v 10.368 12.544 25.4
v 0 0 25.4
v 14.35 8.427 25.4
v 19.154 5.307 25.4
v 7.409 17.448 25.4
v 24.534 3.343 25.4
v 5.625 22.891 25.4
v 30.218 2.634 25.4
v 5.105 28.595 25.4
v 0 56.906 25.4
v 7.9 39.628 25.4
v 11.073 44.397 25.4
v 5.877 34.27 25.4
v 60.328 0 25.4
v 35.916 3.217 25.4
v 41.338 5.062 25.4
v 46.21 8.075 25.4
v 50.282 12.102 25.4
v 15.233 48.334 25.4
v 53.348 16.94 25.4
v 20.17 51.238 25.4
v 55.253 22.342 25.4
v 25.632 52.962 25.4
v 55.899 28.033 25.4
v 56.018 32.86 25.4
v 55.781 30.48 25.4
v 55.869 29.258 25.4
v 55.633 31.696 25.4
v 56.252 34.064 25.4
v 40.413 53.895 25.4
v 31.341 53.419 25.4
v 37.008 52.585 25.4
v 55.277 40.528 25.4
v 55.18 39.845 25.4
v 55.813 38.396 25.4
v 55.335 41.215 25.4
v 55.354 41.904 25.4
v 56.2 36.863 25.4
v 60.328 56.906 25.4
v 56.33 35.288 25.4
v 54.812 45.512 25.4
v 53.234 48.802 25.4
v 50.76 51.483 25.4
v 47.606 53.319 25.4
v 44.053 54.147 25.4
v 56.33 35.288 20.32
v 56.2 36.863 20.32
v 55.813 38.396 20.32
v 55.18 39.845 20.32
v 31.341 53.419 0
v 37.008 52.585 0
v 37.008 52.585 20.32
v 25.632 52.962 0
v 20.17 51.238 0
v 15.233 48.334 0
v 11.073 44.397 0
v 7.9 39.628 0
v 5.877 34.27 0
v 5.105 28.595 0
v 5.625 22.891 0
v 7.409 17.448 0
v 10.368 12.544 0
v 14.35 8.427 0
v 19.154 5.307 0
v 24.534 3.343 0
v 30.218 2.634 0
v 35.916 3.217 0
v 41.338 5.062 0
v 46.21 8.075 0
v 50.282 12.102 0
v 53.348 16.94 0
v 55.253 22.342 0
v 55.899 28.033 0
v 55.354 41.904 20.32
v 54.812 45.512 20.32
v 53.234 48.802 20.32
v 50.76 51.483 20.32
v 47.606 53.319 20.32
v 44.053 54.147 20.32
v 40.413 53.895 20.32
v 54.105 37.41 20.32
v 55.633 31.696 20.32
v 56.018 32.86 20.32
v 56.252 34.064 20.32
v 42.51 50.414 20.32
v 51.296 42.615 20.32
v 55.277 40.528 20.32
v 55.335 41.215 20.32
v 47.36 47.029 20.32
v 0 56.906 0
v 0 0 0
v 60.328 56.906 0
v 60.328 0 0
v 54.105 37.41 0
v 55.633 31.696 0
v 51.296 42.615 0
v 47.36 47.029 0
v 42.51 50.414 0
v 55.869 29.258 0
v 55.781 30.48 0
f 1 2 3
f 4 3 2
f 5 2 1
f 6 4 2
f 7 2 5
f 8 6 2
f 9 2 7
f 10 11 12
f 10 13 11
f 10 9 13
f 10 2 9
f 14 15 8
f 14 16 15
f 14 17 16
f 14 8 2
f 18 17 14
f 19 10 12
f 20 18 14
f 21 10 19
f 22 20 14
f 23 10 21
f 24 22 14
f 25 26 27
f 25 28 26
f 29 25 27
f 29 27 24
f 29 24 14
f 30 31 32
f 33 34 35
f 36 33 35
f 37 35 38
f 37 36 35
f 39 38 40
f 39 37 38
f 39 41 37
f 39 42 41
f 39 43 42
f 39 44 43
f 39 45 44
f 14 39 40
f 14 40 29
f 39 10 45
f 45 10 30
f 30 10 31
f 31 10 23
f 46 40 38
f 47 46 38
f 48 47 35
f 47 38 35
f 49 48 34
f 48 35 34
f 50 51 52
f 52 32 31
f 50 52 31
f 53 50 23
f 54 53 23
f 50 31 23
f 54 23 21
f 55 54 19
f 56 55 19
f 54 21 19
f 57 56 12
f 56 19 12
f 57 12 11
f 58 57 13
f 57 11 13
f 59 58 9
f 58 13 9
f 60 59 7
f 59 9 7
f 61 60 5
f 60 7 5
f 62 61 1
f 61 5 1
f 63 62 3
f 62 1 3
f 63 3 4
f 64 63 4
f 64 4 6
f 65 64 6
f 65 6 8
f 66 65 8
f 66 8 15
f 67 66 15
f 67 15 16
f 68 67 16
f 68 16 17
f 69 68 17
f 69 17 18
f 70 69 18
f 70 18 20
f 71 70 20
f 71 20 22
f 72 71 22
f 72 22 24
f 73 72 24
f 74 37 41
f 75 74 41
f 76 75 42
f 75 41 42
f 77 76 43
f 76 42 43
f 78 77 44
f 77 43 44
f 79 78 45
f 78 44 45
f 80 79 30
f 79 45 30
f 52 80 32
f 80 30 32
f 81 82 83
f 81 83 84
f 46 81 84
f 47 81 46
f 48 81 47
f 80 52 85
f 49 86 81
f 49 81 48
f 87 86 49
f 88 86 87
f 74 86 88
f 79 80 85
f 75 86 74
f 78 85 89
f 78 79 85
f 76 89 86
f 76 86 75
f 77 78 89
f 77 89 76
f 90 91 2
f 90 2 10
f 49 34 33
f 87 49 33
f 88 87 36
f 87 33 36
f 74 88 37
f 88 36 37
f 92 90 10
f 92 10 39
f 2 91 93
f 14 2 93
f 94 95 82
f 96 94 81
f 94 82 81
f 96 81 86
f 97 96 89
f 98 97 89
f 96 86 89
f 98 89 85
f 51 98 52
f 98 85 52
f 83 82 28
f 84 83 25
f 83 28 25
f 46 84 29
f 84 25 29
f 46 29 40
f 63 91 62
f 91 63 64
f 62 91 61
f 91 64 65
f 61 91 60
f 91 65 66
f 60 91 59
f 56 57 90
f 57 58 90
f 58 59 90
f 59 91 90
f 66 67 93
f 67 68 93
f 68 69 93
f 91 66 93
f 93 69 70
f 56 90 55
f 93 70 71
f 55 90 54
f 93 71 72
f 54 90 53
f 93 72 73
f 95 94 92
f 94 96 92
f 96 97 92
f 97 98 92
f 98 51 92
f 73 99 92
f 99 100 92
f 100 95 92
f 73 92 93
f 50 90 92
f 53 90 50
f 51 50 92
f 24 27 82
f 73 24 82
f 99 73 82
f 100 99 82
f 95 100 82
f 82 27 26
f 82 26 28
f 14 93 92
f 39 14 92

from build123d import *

# Parameters (mm, degrees)
F0_W     = 60.3283978999
F0_H     = 56.9055080414
F1_DEPTH = 25.4
F3_DEPTH = 5.08
F5_DEPTH = 25.401


with BuildPart() as f1:
    # F0 (on Top) → F1 (new body)
    with BuildSketch(Plane.XY):
        with Locations((30.1641989499, 28.4527540207)):
            Rectangle(F0_W, F0_H)
    extrude(amount=F1_DEPTH)

    # F2 (on face) → F3 (cut)
    with BuildSketch(Plane.XY.offset(25.4)):
        with BuildLine():
            ThreePointArc((55.1804514534, 39.8446242733), (55.3108318877, 40.8708207203), (55.3543950429, 41.9043488801))
            ThreePointArc((55.3543950429, 41.9043488801), (36.2534657798, 52.11936711), (38.3624892299, 30.5614424362))
            ThreePointArc((38.3624892299, 30.5614424362), (42.0828202021, 43.6972697394), (55.1804514534, 39.8446242733))
        make_face()
        with BuildLine():
            ThreePointArc((55.1804514534, 39.8446242733), (42.0828202021, 43.6972697394), (38.3624892299, 30.5614424362))
            ThreePointArc((38.3624892299, 30.5614424362), (49.0077038635, 31.1517402149), (55.1804514534, 39.8446242733))
        make_face()
        with BuildLine():
            ThreePointArc((55.1804514534, 39.8446242733), (49.0077038635, 31.1517402149), (38.3624892299, 30.5614424362))
            ThreePointArc((38.3624892299, 30.5614424362), (49.1682517649, 25.9984305066), (56.3300997812, 35.287860781))
            ThreePointArc((56.3300997812, 35.287860781), (56.0382540759, 37.6376365577), (55.1804514534, 39.8446242733))
        make_face()
    extrude(amount=-F3_DEPTH, mode=Mode.SUBTRACT)

    # F4 (on face) → F5 (cut, through all)
    with BuildSketch(Plane.XY.offset(25.4)):
        with BuildLine():
            ThreePointArc((37.0080242328, 52.5846074944), (10.3680448546, 12.5437070116), (55.898797074, 28.0328262597))
            ThreePointArc((55.898797074, 28.0328262597), (55.8323251046, 29.8692242337), (55.6332571118, 31.6960104763))
            ThreePointArc((55.6332571118, 31.6960104763), (47.3543007953, 25.7030679225), (38.3624892299, 30.5614424362))
            ThreePointArc((38.3624892299, 30.5614424362), (30.8137212617, 41.1504129454), (37.0080242328, 52.5846074944))
        make_face()
        with BuildLine():
            ThreePointArc((38.3624892299, 30.5614424362), (47.3543007953, 25.7030679225), (55.6332571118, 31.6960104763))
            ThreePointArc((55.6332571118, 31.6960104763), (49.4570170906, 44.9368463083), (37.0080242328, 52.5846074944))
            ThreePointArc((37.0080242328, 52.5846074944), (30.8137212617, 41.1504129454), (38.3624892299, 30.5614424362))
        make_face()
    extrude(amount=-F5_DEPTH, mode=Mode.SUBTRACT)


solid = f1.part
